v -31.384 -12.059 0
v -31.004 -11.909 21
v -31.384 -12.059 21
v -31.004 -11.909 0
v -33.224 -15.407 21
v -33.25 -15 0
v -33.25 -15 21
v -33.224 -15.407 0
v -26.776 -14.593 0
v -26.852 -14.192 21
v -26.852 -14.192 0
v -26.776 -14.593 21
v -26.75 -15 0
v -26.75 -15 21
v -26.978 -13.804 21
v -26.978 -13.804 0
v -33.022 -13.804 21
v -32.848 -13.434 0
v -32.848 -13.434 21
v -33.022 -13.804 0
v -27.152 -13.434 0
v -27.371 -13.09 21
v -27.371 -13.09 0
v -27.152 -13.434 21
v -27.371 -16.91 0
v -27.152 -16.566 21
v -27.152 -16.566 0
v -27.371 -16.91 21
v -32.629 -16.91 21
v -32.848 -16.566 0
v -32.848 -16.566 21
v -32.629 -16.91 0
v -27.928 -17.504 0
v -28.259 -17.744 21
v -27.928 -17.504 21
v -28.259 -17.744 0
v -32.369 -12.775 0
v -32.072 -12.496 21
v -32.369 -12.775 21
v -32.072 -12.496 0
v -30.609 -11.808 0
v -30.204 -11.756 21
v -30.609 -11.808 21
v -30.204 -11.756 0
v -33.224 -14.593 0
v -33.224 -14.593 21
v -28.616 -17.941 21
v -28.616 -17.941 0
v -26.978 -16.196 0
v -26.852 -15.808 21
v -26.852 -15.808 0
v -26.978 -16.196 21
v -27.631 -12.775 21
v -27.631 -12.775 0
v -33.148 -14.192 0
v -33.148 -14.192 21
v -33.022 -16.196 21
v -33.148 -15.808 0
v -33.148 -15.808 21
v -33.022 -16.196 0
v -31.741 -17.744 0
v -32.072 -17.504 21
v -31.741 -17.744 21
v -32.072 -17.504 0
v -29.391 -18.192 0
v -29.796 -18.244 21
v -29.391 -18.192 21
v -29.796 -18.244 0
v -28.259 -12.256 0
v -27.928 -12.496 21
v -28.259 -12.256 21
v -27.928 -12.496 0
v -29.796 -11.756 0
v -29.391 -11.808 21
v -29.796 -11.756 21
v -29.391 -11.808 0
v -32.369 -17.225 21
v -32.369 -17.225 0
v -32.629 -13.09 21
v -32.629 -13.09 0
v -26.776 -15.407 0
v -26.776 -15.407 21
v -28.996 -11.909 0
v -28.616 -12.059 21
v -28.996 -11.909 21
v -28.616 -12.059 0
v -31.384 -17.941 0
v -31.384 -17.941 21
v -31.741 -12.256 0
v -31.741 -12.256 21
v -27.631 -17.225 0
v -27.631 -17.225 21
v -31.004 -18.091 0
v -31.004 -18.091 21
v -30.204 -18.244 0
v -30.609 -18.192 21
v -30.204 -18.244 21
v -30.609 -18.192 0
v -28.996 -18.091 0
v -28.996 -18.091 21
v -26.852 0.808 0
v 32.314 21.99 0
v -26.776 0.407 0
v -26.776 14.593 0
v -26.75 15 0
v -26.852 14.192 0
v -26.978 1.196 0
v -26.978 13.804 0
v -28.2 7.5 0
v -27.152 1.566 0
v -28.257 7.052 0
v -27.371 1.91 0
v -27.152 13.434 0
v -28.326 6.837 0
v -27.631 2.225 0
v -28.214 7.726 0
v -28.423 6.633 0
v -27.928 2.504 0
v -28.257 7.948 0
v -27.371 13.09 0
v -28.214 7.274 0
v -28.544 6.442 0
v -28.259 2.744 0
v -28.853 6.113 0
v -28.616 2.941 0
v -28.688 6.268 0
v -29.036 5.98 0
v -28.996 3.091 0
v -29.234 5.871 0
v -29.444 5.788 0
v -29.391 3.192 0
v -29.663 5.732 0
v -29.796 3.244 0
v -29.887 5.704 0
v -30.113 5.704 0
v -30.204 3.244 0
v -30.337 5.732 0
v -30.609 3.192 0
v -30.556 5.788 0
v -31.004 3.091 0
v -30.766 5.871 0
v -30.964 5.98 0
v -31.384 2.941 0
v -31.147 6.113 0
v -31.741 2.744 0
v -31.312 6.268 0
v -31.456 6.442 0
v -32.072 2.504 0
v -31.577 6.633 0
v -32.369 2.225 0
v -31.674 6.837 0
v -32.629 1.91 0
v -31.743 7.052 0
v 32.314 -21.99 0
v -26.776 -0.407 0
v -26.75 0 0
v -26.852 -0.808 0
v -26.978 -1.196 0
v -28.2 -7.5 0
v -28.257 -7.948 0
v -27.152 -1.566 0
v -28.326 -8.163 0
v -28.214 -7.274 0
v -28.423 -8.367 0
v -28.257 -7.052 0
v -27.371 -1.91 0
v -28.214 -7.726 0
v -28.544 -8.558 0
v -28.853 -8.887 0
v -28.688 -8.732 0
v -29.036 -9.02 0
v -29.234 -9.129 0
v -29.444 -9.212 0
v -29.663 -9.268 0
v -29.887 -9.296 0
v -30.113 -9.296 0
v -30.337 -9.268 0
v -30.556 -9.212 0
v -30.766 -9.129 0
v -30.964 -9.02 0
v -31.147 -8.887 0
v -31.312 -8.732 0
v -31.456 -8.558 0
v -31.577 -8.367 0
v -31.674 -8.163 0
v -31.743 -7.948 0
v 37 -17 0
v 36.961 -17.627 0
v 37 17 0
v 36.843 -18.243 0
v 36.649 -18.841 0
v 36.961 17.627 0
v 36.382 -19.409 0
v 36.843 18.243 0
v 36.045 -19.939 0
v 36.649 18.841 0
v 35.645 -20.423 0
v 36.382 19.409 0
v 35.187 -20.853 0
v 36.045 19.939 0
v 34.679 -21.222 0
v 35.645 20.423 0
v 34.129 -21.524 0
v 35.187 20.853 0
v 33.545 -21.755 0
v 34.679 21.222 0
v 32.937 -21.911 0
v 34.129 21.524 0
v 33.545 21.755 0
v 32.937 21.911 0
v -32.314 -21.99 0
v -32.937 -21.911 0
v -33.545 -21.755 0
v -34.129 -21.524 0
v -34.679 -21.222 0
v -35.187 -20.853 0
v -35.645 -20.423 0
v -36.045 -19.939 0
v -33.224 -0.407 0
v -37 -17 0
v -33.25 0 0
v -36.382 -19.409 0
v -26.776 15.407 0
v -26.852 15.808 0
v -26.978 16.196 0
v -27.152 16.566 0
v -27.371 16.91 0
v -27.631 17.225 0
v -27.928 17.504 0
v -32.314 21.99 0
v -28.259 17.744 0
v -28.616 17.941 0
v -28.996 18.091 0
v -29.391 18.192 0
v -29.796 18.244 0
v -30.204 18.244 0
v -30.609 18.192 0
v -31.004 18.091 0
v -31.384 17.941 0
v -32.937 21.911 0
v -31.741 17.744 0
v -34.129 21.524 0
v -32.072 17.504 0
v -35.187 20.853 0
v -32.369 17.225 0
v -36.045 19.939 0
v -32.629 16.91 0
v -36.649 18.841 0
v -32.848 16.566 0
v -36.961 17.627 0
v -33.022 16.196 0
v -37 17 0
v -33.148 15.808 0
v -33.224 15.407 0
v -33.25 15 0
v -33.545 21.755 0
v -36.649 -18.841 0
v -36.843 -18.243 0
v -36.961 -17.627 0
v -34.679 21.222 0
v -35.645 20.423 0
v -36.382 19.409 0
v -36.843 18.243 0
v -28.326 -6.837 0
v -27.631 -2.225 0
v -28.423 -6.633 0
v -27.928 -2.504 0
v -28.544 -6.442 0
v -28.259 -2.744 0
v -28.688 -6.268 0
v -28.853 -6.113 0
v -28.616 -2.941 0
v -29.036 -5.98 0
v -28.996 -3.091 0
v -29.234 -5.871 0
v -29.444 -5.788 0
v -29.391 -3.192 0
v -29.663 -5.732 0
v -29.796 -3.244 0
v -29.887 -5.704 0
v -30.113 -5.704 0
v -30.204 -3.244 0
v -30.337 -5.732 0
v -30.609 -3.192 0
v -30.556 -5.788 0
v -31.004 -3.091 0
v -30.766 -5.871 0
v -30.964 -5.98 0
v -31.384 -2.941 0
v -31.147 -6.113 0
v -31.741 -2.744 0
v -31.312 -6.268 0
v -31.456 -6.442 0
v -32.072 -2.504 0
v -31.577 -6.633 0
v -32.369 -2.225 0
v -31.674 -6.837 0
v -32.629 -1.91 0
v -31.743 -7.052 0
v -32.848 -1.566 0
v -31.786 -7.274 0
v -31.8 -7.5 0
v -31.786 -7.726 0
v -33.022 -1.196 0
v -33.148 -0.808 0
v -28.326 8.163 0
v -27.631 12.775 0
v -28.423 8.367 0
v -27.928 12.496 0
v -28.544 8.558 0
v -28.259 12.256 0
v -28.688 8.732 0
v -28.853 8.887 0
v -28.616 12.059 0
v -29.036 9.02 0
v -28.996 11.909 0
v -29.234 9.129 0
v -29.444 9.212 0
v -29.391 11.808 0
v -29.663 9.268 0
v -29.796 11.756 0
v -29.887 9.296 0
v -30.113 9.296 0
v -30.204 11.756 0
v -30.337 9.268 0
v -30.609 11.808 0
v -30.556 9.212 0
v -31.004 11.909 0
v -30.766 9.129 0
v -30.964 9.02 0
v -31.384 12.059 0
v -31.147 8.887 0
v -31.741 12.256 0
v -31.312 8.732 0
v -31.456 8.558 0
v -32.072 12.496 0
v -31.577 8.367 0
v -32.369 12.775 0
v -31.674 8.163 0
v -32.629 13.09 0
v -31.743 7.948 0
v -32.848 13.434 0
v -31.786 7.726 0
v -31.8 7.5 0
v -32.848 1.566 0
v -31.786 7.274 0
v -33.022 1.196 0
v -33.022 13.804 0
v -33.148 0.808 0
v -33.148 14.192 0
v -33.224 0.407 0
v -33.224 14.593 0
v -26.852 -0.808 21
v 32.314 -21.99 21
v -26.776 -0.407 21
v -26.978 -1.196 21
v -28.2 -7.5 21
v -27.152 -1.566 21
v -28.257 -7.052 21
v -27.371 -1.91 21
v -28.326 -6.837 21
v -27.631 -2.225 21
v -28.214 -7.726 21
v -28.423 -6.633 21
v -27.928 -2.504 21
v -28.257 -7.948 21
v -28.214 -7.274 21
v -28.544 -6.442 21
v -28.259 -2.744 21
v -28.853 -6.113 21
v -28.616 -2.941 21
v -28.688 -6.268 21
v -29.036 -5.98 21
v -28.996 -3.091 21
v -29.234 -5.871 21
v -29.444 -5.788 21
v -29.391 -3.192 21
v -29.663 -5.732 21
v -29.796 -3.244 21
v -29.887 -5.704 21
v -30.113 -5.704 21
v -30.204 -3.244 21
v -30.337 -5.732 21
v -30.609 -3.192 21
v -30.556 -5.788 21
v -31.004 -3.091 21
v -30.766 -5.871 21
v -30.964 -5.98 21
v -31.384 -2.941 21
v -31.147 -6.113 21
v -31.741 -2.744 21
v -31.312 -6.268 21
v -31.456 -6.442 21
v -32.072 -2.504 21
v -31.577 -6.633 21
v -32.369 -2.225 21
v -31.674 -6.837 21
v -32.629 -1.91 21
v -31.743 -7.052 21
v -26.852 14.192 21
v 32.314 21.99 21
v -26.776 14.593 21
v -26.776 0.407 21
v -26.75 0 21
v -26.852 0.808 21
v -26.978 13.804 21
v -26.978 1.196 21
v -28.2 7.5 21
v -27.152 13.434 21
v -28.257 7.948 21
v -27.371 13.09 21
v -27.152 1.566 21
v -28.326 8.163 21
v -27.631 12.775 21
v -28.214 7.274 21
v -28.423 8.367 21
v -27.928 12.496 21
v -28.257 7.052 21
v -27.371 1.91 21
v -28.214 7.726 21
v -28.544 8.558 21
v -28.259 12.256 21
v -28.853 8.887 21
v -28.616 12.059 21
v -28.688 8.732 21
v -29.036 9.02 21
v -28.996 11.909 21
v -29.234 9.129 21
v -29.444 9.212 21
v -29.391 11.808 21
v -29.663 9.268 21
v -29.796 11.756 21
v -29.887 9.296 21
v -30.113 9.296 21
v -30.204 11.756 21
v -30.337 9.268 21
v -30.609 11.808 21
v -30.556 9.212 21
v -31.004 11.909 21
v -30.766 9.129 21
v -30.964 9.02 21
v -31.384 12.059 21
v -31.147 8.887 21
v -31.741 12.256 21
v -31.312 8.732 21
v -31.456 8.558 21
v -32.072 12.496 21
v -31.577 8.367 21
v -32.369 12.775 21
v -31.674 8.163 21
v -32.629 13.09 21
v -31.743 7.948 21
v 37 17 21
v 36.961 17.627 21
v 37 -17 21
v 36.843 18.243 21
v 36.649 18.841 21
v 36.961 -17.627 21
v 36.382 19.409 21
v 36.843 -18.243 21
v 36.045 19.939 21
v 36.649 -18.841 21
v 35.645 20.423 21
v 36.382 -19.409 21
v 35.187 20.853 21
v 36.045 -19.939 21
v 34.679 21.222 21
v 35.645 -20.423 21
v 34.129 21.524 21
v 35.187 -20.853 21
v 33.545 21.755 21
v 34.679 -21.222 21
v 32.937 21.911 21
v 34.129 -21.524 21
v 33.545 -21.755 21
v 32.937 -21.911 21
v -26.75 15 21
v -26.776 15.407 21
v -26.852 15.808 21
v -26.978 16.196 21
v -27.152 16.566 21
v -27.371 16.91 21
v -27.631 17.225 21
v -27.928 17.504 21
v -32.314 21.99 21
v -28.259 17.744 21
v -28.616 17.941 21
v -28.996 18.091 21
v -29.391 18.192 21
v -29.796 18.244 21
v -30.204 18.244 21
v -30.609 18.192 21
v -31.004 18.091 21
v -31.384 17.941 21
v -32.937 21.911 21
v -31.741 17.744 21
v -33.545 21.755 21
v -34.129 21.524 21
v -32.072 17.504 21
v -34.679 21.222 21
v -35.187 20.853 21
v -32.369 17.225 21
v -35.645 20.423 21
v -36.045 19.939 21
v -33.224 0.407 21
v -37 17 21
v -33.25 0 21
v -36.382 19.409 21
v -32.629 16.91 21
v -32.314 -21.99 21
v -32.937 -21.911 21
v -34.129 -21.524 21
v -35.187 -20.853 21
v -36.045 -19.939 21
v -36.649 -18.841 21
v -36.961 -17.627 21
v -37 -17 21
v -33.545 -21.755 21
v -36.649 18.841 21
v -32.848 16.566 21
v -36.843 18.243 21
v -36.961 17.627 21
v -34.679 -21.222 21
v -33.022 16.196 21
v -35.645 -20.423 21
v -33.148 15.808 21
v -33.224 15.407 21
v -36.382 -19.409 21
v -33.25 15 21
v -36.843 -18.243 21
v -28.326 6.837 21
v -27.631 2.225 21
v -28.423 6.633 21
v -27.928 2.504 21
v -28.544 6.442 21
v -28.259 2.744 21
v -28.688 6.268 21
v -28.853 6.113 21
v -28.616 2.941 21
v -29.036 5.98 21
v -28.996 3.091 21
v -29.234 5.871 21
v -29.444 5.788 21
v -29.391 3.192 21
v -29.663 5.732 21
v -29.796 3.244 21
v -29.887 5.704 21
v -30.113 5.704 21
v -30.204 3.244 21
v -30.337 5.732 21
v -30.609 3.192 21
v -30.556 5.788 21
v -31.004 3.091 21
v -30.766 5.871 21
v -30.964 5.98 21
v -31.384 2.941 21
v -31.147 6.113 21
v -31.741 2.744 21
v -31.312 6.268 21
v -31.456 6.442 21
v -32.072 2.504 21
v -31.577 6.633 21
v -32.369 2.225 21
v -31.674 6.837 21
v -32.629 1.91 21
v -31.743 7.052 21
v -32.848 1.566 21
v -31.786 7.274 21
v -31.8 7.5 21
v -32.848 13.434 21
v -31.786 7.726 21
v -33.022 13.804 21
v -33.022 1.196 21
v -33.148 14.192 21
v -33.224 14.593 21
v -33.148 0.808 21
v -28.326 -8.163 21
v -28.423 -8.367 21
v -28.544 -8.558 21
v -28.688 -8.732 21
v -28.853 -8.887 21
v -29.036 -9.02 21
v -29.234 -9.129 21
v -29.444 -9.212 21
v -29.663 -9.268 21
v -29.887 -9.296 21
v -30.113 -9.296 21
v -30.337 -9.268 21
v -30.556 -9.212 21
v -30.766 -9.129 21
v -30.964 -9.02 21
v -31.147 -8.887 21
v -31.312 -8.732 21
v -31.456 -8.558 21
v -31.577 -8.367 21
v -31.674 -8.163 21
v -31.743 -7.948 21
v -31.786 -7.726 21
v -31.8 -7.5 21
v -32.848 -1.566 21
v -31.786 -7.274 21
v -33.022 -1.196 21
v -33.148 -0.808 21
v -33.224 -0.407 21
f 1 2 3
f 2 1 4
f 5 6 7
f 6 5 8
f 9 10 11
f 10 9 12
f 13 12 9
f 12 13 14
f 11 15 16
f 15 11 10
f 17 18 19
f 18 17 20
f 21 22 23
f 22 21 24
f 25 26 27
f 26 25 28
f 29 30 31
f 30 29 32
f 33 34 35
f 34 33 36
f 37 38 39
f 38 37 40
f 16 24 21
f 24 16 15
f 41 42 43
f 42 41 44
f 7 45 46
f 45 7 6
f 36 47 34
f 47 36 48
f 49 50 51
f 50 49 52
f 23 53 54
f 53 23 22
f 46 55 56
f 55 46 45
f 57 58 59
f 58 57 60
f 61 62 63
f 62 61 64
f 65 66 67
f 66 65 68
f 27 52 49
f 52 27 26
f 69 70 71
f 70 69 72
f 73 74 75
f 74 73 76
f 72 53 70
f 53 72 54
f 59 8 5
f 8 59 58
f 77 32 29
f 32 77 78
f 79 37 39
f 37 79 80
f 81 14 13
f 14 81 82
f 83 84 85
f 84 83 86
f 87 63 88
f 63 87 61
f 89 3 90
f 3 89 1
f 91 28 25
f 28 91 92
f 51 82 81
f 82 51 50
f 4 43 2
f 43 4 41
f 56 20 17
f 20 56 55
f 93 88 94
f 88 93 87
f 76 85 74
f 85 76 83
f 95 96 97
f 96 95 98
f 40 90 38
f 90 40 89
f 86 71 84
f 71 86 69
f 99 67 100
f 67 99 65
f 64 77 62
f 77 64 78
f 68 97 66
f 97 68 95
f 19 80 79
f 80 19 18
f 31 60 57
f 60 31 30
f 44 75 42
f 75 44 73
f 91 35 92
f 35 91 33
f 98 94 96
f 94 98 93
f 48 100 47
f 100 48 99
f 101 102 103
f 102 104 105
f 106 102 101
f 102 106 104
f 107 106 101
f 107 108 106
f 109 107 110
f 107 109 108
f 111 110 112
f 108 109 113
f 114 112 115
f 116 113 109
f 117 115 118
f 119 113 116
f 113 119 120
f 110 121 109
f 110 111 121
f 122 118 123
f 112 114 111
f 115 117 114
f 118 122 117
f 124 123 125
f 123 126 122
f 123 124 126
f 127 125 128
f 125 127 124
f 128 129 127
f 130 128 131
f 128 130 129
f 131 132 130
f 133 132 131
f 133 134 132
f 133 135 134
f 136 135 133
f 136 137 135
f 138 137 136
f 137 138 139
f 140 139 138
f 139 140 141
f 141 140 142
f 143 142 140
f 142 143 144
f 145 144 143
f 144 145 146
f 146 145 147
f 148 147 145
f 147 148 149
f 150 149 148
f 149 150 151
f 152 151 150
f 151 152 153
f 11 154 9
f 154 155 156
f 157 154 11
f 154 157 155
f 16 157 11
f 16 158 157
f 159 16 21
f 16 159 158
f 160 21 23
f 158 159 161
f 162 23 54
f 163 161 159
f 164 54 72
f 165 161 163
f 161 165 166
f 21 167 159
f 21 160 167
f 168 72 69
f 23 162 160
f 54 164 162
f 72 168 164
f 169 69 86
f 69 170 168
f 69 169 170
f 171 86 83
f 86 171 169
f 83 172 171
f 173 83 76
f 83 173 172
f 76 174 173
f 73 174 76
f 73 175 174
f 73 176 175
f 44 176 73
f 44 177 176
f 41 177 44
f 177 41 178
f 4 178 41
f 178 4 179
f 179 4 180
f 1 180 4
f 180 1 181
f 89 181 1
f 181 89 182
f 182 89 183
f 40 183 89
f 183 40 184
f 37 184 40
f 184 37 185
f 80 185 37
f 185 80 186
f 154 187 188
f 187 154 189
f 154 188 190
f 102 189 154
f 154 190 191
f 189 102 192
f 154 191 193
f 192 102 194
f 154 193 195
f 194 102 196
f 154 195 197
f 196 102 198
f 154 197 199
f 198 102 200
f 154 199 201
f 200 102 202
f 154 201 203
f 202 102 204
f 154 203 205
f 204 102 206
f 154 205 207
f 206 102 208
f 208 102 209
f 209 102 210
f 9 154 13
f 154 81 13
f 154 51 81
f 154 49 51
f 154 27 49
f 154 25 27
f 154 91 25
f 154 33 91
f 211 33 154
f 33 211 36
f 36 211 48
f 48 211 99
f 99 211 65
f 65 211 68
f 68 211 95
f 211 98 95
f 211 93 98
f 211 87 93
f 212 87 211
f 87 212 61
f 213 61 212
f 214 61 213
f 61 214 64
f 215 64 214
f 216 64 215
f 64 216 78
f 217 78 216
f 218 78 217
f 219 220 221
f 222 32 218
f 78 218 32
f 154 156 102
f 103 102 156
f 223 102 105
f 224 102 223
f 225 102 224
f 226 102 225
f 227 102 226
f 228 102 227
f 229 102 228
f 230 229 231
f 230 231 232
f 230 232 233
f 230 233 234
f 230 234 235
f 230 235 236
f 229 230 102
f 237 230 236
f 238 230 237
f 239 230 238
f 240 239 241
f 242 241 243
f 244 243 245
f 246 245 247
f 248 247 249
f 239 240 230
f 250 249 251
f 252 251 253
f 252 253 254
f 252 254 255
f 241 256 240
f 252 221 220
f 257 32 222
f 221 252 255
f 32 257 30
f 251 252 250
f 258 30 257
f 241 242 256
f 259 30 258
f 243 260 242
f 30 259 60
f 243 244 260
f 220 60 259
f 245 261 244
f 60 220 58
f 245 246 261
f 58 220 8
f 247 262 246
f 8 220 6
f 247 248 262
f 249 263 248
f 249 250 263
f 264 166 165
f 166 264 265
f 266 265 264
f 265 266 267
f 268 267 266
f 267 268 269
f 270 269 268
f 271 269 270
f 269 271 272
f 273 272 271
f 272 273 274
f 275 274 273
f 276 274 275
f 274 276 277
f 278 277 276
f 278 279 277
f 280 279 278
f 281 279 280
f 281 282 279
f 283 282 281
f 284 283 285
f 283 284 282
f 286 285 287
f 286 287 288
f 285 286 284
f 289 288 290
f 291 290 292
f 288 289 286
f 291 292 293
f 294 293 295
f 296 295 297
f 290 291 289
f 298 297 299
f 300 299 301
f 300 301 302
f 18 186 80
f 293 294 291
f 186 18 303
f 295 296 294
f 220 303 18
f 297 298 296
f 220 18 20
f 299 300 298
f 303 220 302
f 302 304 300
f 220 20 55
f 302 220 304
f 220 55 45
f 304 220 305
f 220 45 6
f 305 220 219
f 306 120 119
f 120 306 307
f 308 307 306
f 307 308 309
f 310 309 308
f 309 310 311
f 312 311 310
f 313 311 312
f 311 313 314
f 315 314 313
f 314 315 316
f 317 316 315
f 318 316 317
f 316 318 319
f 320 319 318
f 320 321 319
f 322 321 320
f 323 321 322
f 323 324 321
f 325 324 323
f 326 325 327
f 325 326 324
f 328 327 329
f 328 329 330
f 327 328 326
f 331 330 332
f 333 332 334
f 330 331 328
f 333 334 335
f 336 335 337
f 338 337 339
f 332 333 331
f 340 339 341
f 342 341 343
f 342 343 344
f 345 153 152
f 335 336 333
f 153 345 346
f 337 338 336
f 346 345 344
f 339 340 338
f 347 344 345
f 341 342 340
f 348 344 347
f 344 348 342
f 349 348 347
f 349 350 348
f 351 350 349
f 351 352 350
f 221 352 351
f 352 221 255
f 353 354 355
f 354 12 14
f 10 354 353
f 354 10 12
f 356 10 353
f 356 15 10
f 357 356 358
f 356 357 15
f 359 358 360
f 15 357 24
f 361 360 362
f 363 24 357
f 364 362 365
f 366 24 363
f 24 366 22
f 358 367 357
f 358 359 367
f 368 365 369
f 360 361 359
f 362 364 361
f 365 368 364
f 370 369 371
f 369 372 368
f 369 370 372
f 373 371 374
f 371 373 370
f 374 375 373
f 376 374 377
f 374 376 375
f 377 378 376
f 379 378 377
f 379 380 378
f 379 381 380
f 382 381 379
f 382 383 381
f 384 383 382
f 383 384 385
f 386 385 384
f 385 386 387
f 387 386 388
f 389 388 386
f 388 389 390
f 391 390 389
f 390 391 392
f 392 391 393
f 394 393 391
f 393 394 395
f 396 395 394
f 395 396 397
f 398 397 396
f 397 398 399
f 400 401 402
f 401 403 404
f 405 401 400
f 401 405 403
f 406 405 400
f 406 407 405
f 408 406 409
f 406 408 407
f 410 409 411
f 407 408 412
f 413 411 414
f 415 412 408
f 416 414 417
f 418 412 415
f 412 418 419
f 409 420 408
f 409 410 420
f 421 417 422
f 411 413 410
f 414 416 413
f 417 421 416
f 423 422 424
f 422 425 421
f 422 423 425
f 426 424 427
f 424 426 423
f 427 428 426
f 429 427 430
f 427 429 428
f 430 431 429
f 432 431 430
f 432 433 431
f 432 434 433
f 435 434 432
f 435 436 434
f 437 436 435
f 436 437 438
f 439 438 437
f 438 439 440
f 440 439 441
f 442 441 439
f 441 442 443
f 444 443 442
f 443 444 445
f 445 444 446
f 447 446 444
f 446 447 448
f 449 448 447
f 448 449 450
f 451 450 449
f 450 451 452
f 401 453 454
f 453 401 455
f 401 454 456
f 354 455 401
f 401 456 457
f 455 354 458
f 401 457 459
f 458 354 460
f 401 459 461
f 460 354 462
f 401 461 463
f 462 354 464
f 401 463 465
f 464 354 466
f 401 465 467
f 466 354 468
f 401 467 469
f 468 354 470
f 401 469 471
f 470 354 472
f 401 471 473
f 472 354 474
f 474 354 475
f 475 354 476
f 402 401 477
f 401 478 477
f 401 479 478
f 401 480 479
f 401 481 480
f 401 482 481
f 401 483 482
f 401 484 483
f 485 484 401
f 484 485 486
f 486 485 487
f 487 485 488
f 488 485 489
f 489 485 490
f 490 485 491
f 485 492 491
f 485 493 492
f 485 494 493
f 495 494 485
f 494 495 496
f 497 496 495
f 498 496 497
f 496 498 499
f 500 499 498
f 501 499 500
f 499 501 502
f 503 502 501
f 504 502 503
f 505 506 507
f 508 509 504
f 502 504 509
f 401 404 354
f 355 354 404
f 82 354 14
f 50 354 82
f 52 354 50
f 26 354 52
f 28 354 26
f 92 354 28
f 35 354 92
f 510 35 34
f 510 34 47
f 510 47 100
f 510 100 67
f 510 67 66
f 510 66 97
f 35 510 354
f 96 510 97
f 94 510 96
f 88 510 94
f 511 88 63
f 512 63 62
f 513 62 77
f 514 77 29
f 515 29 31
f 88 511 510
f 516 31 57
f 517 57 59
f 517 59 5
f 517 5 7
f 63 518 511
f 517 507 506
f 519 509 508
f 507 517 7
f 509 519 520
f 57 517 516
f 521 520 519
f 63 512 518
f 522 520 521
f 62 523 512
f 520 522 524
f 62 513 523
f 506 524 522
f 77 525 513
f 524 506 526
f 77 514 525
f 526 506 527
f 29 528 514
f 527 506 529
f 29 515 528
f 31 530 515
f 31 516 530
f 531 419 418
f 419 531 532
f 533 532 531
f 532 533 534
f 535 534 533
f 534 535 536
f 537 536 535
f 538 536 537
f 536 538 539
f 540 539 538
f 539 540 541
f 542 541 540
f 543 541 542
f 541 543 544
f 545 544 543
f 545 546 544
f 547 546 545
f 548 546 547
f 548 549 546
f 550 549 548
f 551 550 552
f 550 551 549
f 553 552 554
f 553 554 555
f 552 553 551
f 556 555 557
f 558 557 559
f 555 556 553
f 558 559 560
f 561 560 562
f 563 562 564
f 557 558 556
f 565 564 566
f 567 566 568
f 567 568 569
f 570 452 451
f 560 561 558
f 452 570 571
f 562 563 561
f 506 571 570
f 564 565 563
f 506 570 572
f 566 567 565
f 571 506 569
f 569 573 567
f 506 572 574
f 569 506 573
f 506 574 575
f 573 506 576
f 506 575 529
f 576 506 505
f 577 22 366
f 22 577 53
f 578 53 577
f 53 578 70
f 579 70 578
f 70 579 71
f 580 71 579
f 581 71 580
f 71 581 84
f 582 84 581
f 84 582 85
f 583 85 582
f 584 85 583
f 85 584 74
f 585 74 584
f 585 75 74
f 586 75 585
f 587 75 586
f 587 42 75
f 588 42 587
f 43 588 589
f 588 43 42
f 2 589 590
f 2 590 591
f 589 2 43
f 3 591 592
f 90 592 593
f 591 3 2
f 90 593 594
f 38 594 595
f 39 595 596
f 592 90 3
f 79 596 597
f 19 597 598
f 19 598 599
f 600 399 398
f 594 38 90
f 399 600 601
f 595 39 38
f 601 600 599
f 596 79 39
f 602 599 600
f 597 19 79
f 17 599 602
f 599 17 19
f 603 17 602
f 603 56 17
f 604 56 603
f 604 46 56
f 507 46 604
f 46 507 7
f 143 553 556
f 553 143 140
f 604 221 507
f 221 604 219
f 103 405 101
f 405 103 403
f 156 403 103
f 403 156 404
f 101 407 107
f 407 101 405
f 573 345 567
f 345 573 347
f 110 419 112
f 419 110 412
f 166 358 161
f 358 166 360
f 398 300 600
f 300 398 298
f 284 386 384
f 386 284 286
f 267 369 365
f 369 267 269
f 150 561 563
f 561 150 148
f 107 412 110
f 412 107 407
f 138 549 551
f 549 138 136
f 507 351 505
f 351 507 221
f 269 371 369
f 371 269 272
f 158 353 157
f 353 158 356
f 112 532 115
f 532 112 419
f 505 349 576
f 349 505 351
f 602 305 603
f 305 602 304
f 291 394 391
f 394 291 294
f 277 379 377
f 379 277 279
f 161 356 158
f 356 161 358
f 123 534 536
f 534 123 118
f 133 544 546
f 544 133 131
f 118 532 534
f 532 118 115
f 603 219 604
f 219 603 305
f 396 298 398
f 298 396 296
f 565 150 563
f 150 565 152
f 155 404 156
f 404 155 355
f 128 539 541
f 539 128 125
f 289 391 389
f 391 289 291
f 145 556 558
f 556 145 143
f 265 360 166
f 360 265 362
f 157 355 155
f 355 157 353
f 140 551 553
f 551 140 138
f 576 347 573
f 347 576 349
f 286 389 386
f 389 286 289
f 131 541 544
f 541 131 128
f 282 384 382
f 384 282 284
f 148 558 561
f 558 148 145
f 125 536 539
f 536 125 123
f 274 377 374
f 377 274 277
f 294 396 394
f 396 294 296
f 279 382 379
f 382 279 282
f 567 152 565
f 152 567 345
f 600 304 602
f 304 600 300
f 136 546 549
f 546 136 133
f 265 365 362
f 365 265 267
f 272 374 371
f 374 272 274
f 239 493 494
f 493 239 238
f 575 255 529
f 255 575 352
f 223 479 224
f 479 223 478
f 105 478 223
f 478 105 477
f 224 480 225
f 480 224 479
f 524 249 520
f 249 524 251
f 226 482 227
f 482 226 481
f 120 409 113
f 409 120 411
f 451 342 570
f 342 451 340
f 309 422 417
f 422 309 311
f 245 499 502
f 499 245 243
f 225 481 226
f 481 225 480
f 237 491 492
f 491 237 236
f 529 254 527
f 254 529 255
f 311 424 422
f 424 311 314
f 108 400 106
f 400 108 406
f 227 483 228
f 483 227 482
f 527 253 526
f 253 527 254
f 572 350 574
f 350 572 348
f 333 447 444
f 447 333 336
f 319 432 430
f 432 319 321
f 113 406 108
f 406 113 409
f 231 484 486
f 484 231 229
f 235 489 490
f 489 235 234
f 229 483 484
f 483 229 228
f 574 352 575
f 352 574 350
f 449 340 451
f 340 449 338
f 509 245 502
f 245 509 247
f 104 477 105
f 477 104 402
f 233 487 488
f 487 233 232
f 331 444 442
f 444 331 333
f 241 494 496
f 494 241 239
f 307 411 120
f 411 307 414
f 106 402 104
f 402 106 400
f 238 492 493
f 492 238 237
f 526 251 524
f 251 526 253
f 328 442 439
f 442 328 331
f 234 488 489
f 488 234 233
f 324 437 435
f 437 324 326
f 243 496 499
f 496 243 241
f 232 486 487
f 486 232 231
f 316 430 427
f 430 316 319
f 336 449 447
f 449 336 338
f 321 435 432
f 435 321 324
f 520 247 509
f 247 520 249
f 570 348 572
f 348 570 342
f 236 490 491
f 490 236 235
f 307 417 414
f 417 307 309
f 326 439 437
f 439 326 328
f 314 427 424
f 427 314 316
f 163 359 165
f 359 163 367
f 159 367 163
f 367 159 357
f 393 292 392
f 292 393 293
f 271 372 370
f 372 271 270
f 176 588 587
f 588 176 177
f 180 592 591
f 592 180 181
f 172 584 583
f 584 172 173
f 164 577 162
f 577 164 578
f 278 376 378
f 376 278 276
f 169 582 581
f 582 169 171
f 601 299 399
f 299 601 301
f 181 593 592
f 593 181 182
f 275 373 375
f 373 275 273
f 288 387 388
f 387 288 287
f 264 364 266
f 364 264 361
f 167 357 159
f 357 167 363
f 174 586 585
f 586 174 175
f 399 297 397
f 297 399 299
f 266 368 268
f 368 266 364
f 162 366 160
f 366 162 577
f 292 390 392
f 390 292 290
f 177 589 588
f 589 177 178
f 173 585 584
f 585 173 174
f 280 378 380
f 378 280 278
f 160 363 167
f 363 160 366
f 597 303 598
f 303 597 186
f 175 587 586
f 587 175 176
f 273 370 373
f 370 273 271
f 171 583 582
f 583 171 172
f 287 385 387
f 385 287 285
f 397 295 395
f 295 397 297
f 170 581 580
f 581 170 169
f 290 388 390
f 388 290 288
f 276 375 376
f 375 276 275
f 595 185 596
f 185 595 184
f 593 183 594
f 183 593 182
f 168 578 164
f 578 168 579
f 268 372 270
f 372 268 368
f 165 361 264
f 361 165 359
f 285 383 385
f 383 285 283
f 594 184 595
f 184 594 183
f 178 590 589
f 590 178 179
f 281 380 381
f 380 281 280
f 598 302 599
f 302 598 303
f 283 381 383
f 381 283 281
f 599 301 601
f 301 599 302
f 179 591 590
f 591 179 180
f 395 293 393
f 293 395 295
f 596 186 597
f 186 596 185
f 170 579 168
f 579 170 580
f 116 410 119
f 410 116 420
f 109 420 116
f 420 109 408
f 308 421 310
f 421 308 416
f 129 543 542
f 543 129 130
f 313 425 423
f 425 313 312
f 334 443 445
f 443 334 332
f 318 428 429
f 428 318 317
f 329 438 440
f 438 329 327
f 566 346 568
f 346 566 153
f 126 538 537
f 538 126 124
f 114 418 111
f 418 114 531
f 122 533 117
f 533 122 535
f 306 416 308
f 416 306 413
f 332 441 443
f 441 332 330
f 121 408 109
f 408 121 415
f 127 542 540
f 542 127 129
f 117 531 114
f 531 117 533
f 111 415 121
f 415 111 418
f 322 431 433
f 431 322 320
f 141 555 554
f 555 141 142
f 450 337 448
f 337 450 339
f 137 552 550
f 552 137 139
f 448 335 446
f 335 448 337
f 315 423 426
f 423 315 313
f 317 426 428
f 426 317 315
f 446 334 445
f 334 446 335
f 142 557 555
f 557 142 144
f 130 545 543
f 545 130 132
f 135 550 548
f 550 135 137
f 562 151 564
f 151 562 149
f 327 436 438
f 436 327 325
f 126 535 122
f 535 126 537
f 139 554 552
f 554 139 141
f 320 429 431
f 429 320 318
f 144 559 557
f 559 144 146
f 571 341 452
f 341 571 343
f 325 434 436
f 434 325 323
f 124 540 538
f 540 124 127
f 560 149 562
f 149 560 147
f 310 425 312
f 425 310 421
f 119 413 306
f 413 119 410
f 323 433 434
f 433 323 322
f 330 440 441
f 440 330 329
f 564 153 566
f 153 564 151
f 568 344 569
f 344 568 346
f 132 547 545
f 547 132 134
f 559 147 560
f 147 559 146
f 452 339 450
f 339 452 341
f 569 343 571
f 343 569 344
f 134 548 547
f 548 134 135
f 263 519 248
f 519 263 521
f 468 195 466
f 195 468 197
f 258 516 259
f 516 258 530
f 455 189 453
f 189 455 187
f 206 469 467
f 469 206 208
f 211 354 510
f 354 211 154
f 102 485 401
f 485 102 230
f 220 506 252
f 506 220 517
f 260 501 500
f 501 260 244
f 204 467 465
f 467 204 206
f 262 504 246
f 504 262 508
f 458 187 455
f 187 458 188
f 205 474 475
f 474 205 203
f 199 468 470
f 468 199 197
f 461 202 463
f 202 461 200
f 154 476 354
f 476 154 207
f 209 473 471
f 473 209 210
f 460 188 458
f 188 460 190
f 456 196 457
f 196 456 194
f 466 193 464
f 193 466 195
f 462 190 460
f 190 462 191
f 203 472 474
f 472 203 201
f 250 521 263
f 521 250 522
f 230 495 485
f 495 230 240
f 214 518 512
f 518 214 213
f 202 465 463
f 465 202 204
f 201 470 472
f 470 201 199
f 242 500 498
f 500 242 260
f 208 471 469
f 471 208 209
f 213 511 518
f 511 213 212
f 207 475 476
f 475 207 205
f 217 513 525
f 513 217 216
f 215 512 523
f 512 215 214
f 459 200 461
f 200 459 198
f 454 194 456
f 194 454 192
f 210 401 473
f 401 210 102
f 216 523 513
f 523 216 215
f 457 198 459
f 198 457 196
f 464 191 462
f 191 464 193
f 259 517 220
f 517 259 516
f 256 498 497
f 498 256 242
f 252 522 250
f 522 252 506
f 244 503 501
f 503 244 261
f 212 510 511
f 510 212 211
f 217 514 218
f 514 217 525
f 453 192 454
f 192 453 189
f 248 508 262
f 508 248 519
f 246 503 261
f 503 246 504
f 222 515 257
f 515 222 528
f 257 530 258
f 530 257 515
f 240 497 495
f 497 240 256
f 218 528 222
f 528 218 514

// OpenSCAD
$fn = 50;


difference() {
	union() {
		hull() {
			translate(v = [-32.0000000000, 17.0000000000, 0]) {
				cylinder(h = 21, r = 5);
			}
			translate(v = [32.0000000000, 17.0000000000, 0]) {
				cylinder(h = 21, r = 5);
			}
			translate(v = [-32.0000000000, -17.0000000000, 0]) {
				cylinder(h = 21, r = 5);
			}
			translate(v = [32.0000000000, -17.0000000000, 0]) {
				cylinder(h = 21, r = 5);
			}
		}
	}
	union() {
		translate(v = [-30.0000000000, -15.0000000000, 0]) {
			cylinder(h = 21, r = 3.2500000000);
		}
		translate(v = [-30.0000000000, 0.0000000000, 0]) {
			cylinder(h = 21, r = 3.2500000000);
		}
		translate(v = [-30.0000000000, 15.0000000000, 0]) {
			cylinder(h = 21, r = 3.2500000000);
		}
		translate(v = [-30.0000000000, -15.0000000000, 0]) {
			cylinder(h = 21, r = 1.8000000000);
		}
		translate(v = [-30.0000000000, -7.5000000000, 0]) {
			cylinder(h = 21, r = 1.8000000000);
		}
		translate(v = [-30.0000000000, 0.0000000000, 0]) {
			cylinder(h = 21, r = 1.8000000000);
		}
		translate(v = [-30.0000000000, 7.5000000000, 0]) {
			cylinder(h = 21, r = 1.8000000000);
		}
		translate(v = [-30.0000000000, 15.0000000000, 0]) {
			cylinder(h = 21, r = 1.8000000000);
		}
		translate(v = [-30.0000000000, -15.0000000000, 0]) {
			cylinder(h = 21, r = 1.8000000000);
		}
		translate(v = [-30.0000000000, -7.5000000000, 0]) {
			cylinder(h = 21, r = 1.8000000000);
		}
		translate(v = [-30.0000000000, 0.0000000000, 0]) {
			cylinder(h = 21, r = 1.8000000000);
		}
		translate(v = [-30.0000000000, 7.5000000000, 0]) {
			cylinder(h = 21, r = 1.8000000000);
		}
		translate(v = [-30.0000000000, 15.0000000000, 0]) {
			cylinder(h = 21, r = 1.8000000000);
		}
		translate(v = [-30.0000000000, -15.0000000000, 0]) {
			cylinder(h = 21, r = 1.8000000000);
		}
		translate(v = [-30.0000000000, -7.5000000000, 0]) {
			cylinder(h = 21, r = 1.8000000000);
		}
		translate(v = [-30.0000000000, 0.0000000000, 0]) {
			cylinder(h = 21, r = 1.8000000000);
		}
		translate(v = [-30.0000000000, 7.5000000000, 0]) {
			cylinder(h = 21, r = 1.8000000000);
		}
		translate(v = [-30.0000000000, 15.0000000000, 0]) {
			cylinder(h = 21, r = 1.8000000000);
		}
	}
}
